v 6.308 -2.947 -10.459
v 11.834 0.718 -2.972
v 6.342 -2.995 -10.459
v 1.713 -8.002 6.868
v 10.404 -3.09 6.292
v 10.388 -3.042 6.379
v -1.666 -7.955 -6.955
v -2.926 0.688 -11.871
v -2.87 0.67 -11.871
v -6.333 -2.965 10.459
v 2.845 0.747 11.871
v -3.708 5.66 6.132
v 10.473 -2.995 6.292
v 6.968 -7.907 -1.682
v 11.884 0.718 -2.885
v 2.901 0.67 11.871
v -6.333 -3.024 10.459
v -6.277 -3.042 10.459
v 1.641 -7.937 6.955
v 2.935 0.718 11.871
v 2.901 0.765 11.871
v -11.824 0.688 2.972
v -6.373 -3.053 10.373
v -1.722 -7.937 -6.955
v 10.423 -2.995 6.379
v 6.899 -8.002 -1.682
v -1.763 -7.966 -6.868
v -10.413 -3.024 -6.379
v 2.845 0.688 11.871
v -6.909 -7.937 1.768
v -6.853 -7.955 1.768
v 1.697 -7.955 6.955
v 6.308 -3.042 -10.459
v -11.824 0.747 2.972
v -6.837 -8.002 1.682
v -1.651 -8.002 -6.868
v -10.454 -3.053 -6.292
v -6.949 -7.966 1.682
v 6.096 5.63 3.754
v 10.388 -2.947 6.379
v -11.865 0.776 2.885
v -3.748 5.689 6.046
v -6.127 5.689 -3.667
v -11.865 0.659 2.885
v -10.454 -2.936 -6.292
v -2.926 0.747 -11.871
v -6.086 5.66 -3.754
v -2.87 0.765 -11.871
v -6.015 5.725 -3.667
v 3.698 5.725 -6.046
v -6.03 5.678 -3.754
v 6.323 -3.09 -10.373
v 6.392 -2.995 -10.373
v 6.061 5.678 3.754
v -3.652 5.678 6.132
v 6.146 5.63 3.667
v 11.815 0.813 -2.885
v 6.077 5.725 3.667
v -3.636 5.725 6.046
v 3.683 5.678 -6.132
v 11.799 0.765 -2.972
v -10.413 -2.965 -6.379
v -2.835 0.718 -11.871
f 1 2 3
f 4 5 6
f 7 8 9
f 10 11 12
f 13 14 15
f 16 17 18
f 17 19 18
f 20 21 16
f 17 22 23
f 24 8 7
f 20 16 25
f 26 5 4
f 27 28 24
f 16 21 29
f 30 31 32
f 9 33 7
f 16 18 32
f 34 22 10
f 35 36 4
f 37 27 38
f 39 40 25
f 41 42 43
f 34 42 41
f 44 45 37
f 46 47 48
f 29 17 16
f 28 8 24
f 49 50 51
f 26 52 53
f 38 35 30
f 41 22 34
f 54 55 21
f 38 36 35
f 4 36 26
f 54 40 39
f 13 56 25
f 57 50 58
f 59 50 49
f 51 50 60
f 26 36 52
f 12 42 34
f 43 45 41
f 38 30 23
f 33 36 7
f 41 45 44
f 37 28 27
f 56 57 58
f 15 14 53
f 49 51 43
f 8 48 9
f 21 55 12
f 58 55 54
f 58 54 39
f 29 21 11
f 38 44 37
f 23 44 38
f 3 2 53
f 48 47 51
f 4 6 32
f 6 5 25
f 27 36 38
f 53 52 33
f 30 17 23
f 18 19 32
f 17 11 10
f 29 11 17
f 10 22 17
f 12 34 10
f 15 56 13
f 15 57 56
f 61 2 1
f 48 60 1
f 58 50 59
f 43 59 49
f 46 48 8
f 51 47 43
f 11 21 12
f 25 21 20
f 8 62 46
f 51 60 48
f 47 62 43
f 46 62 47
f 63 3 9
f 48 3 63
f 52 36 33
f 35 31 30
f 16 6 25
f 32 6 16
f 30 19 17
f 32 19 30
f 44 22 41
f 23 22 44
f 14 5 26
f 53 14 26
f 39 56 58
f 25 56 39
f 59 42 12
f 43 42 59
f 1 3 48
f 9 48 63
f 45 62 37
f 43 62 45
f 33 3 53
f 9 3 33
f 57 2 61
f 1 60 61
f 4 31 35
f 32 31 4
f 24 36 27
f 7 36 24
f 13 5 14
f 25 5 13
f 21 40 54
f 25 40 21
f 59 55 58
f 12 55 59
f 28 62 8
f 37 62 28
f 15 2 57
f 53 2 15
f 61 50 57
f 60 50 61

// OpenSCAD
// Auto-generated OpenSCAD file

    inner_points = 10*[[-0.2885376862918134, 0.07175899174657377, -1.1783945441115085], [0.28853768640082145, 0.07175900040332306, 1.1783945428274933], [-1.1783945434149965, 0.0717589960423746, 0.28853768570430977], [1.1783945435240049, 0.07175899610752223, -0.28853768698832505], [-1.037277726864703, -0.29945504957306746, -0.6292238173151442], [0.6292238183363167, -0.2994550495270012, -1.0372777266018605], [-0.6292238175779867, -0.29945504345182133, 1.0372777278858758], [1.037277727623033, -0.299455043405755, 0.6292238185991594], [-0.16817179443109592, -0.7907165367613447, -0.6868174750759801], [0.16817179604873278, -0.7907165317158302, 0.6868174797585049], [-0.686817476608424, -0.7907165342575728, 0.16817179758117676], [0.6868174782260609, -0.7907165342196021, -0.16817179289865195], [-0.6045687129127788, 0.5630204820268412, -0.366737881241974], [0.36673787852556217, 0.5630204820536906, -0.604568714878892], [-0.366737879275861, 0.5630204855945586, 0.6045687101963672], [0.6045687121624802, 0.563020485621408, 0.3667378765594492]];

    outer_points = 10*[[-1.213205545812953, 0.07387883237032282, -0.17027003437574006], [1.2132055459196738, 0.07387883237032282, -0.17027003361533383], [-9.797521174090613e-11, 1.186835379548445, 0.3126330832175659], [2.0469611576138433e-10, -1.0390777148077994, -0.6531731512086397], [-0.8578658686155681, 0.7131002893052931, 0.5117341025641999], [-0.8578658684015472, -0.8608579540459387, -0.17119403511081444], [0.8578658682948263, 0.7131002893052931, 0.5117341031018883], [0.8578658685088472, -0.8608579540459387, -0.17119403457312604], [-0.7071067813811416, -0.2694200616443975, 0.6209378460253994], [0.7071067809919536, -0.2694200616443975, 0.6209378464685957], [-2.827987185956705e-10, 0.3792574228569266, 0.9023939193757089], [-1.0638924793604034e-10, -0.9180975461457217, 0.33948177311828626], [-0.49999999986777616, 0.7281043097383153, -0.42191834848824256], [-0.49999999974303583, -0.1892641864495203, -0.8199573443191398], [0.5000000001322238, 0.7281043097383153, -0.42191834817485535], [0.5000000002569641, -0.1892641864495203, -0.8199573440057525]];

    // Convex hull for inner set (I)
    module inner_hull() {
        hull() {
            for (p = inner_points) {
                translate(p) sphere(r=0.1);
            }
        }
    }

    // Convex hull for outer set (O) minus inner hull (O \ I)
    module outer_minus_inner() {
        difference() {
            hull() {
                for (p = outer_points) {
                    translate(p) sphere(r=0.1);
                }
            }
            inner_hull(); // Subtract inner hull
        }
    }

    // Convex hull for outer set (O) minus all translated inner hulls
    module outer_minus_AllTranslationInner() {
        difference() {
            hull() {
                for (p = outer_points) {
                    translate(p) sphere(r=0.1);
                }
            }
            hull() {
                translate([0,0,50]) inner_hull();
                translate([0,0,-50]) inner_hull();
            }; // Subtract translated inner hulls
        }
    }

    // Difference between outer_minus_inner and outer_minus_AllTranslationInner
    module outer_minus_inner_diff() {
        difference() {
            // Outer minus inner
            difference() {
                hull() {
                    for (p = outer_points) {
                        translate(p) sphere(r=0.1);
                    }
                }
                inner_hull();
            }

            // Subtract Outer minus AllTranslationInner
            difference() {
                hull() {
                    for (p = outer_points) {
                        translate(p) sphere(r=0.1);
                    }
                }
                hull() {
                    translate([0,0,50]) inner_hull();
                    translate([0,0,-50]) inner_hull();
                };
            }
        }
    }

    // Rendering all with colors applied
    color([1, 0, 0, 0.5]) inner_hull(); // Transparent red
    
